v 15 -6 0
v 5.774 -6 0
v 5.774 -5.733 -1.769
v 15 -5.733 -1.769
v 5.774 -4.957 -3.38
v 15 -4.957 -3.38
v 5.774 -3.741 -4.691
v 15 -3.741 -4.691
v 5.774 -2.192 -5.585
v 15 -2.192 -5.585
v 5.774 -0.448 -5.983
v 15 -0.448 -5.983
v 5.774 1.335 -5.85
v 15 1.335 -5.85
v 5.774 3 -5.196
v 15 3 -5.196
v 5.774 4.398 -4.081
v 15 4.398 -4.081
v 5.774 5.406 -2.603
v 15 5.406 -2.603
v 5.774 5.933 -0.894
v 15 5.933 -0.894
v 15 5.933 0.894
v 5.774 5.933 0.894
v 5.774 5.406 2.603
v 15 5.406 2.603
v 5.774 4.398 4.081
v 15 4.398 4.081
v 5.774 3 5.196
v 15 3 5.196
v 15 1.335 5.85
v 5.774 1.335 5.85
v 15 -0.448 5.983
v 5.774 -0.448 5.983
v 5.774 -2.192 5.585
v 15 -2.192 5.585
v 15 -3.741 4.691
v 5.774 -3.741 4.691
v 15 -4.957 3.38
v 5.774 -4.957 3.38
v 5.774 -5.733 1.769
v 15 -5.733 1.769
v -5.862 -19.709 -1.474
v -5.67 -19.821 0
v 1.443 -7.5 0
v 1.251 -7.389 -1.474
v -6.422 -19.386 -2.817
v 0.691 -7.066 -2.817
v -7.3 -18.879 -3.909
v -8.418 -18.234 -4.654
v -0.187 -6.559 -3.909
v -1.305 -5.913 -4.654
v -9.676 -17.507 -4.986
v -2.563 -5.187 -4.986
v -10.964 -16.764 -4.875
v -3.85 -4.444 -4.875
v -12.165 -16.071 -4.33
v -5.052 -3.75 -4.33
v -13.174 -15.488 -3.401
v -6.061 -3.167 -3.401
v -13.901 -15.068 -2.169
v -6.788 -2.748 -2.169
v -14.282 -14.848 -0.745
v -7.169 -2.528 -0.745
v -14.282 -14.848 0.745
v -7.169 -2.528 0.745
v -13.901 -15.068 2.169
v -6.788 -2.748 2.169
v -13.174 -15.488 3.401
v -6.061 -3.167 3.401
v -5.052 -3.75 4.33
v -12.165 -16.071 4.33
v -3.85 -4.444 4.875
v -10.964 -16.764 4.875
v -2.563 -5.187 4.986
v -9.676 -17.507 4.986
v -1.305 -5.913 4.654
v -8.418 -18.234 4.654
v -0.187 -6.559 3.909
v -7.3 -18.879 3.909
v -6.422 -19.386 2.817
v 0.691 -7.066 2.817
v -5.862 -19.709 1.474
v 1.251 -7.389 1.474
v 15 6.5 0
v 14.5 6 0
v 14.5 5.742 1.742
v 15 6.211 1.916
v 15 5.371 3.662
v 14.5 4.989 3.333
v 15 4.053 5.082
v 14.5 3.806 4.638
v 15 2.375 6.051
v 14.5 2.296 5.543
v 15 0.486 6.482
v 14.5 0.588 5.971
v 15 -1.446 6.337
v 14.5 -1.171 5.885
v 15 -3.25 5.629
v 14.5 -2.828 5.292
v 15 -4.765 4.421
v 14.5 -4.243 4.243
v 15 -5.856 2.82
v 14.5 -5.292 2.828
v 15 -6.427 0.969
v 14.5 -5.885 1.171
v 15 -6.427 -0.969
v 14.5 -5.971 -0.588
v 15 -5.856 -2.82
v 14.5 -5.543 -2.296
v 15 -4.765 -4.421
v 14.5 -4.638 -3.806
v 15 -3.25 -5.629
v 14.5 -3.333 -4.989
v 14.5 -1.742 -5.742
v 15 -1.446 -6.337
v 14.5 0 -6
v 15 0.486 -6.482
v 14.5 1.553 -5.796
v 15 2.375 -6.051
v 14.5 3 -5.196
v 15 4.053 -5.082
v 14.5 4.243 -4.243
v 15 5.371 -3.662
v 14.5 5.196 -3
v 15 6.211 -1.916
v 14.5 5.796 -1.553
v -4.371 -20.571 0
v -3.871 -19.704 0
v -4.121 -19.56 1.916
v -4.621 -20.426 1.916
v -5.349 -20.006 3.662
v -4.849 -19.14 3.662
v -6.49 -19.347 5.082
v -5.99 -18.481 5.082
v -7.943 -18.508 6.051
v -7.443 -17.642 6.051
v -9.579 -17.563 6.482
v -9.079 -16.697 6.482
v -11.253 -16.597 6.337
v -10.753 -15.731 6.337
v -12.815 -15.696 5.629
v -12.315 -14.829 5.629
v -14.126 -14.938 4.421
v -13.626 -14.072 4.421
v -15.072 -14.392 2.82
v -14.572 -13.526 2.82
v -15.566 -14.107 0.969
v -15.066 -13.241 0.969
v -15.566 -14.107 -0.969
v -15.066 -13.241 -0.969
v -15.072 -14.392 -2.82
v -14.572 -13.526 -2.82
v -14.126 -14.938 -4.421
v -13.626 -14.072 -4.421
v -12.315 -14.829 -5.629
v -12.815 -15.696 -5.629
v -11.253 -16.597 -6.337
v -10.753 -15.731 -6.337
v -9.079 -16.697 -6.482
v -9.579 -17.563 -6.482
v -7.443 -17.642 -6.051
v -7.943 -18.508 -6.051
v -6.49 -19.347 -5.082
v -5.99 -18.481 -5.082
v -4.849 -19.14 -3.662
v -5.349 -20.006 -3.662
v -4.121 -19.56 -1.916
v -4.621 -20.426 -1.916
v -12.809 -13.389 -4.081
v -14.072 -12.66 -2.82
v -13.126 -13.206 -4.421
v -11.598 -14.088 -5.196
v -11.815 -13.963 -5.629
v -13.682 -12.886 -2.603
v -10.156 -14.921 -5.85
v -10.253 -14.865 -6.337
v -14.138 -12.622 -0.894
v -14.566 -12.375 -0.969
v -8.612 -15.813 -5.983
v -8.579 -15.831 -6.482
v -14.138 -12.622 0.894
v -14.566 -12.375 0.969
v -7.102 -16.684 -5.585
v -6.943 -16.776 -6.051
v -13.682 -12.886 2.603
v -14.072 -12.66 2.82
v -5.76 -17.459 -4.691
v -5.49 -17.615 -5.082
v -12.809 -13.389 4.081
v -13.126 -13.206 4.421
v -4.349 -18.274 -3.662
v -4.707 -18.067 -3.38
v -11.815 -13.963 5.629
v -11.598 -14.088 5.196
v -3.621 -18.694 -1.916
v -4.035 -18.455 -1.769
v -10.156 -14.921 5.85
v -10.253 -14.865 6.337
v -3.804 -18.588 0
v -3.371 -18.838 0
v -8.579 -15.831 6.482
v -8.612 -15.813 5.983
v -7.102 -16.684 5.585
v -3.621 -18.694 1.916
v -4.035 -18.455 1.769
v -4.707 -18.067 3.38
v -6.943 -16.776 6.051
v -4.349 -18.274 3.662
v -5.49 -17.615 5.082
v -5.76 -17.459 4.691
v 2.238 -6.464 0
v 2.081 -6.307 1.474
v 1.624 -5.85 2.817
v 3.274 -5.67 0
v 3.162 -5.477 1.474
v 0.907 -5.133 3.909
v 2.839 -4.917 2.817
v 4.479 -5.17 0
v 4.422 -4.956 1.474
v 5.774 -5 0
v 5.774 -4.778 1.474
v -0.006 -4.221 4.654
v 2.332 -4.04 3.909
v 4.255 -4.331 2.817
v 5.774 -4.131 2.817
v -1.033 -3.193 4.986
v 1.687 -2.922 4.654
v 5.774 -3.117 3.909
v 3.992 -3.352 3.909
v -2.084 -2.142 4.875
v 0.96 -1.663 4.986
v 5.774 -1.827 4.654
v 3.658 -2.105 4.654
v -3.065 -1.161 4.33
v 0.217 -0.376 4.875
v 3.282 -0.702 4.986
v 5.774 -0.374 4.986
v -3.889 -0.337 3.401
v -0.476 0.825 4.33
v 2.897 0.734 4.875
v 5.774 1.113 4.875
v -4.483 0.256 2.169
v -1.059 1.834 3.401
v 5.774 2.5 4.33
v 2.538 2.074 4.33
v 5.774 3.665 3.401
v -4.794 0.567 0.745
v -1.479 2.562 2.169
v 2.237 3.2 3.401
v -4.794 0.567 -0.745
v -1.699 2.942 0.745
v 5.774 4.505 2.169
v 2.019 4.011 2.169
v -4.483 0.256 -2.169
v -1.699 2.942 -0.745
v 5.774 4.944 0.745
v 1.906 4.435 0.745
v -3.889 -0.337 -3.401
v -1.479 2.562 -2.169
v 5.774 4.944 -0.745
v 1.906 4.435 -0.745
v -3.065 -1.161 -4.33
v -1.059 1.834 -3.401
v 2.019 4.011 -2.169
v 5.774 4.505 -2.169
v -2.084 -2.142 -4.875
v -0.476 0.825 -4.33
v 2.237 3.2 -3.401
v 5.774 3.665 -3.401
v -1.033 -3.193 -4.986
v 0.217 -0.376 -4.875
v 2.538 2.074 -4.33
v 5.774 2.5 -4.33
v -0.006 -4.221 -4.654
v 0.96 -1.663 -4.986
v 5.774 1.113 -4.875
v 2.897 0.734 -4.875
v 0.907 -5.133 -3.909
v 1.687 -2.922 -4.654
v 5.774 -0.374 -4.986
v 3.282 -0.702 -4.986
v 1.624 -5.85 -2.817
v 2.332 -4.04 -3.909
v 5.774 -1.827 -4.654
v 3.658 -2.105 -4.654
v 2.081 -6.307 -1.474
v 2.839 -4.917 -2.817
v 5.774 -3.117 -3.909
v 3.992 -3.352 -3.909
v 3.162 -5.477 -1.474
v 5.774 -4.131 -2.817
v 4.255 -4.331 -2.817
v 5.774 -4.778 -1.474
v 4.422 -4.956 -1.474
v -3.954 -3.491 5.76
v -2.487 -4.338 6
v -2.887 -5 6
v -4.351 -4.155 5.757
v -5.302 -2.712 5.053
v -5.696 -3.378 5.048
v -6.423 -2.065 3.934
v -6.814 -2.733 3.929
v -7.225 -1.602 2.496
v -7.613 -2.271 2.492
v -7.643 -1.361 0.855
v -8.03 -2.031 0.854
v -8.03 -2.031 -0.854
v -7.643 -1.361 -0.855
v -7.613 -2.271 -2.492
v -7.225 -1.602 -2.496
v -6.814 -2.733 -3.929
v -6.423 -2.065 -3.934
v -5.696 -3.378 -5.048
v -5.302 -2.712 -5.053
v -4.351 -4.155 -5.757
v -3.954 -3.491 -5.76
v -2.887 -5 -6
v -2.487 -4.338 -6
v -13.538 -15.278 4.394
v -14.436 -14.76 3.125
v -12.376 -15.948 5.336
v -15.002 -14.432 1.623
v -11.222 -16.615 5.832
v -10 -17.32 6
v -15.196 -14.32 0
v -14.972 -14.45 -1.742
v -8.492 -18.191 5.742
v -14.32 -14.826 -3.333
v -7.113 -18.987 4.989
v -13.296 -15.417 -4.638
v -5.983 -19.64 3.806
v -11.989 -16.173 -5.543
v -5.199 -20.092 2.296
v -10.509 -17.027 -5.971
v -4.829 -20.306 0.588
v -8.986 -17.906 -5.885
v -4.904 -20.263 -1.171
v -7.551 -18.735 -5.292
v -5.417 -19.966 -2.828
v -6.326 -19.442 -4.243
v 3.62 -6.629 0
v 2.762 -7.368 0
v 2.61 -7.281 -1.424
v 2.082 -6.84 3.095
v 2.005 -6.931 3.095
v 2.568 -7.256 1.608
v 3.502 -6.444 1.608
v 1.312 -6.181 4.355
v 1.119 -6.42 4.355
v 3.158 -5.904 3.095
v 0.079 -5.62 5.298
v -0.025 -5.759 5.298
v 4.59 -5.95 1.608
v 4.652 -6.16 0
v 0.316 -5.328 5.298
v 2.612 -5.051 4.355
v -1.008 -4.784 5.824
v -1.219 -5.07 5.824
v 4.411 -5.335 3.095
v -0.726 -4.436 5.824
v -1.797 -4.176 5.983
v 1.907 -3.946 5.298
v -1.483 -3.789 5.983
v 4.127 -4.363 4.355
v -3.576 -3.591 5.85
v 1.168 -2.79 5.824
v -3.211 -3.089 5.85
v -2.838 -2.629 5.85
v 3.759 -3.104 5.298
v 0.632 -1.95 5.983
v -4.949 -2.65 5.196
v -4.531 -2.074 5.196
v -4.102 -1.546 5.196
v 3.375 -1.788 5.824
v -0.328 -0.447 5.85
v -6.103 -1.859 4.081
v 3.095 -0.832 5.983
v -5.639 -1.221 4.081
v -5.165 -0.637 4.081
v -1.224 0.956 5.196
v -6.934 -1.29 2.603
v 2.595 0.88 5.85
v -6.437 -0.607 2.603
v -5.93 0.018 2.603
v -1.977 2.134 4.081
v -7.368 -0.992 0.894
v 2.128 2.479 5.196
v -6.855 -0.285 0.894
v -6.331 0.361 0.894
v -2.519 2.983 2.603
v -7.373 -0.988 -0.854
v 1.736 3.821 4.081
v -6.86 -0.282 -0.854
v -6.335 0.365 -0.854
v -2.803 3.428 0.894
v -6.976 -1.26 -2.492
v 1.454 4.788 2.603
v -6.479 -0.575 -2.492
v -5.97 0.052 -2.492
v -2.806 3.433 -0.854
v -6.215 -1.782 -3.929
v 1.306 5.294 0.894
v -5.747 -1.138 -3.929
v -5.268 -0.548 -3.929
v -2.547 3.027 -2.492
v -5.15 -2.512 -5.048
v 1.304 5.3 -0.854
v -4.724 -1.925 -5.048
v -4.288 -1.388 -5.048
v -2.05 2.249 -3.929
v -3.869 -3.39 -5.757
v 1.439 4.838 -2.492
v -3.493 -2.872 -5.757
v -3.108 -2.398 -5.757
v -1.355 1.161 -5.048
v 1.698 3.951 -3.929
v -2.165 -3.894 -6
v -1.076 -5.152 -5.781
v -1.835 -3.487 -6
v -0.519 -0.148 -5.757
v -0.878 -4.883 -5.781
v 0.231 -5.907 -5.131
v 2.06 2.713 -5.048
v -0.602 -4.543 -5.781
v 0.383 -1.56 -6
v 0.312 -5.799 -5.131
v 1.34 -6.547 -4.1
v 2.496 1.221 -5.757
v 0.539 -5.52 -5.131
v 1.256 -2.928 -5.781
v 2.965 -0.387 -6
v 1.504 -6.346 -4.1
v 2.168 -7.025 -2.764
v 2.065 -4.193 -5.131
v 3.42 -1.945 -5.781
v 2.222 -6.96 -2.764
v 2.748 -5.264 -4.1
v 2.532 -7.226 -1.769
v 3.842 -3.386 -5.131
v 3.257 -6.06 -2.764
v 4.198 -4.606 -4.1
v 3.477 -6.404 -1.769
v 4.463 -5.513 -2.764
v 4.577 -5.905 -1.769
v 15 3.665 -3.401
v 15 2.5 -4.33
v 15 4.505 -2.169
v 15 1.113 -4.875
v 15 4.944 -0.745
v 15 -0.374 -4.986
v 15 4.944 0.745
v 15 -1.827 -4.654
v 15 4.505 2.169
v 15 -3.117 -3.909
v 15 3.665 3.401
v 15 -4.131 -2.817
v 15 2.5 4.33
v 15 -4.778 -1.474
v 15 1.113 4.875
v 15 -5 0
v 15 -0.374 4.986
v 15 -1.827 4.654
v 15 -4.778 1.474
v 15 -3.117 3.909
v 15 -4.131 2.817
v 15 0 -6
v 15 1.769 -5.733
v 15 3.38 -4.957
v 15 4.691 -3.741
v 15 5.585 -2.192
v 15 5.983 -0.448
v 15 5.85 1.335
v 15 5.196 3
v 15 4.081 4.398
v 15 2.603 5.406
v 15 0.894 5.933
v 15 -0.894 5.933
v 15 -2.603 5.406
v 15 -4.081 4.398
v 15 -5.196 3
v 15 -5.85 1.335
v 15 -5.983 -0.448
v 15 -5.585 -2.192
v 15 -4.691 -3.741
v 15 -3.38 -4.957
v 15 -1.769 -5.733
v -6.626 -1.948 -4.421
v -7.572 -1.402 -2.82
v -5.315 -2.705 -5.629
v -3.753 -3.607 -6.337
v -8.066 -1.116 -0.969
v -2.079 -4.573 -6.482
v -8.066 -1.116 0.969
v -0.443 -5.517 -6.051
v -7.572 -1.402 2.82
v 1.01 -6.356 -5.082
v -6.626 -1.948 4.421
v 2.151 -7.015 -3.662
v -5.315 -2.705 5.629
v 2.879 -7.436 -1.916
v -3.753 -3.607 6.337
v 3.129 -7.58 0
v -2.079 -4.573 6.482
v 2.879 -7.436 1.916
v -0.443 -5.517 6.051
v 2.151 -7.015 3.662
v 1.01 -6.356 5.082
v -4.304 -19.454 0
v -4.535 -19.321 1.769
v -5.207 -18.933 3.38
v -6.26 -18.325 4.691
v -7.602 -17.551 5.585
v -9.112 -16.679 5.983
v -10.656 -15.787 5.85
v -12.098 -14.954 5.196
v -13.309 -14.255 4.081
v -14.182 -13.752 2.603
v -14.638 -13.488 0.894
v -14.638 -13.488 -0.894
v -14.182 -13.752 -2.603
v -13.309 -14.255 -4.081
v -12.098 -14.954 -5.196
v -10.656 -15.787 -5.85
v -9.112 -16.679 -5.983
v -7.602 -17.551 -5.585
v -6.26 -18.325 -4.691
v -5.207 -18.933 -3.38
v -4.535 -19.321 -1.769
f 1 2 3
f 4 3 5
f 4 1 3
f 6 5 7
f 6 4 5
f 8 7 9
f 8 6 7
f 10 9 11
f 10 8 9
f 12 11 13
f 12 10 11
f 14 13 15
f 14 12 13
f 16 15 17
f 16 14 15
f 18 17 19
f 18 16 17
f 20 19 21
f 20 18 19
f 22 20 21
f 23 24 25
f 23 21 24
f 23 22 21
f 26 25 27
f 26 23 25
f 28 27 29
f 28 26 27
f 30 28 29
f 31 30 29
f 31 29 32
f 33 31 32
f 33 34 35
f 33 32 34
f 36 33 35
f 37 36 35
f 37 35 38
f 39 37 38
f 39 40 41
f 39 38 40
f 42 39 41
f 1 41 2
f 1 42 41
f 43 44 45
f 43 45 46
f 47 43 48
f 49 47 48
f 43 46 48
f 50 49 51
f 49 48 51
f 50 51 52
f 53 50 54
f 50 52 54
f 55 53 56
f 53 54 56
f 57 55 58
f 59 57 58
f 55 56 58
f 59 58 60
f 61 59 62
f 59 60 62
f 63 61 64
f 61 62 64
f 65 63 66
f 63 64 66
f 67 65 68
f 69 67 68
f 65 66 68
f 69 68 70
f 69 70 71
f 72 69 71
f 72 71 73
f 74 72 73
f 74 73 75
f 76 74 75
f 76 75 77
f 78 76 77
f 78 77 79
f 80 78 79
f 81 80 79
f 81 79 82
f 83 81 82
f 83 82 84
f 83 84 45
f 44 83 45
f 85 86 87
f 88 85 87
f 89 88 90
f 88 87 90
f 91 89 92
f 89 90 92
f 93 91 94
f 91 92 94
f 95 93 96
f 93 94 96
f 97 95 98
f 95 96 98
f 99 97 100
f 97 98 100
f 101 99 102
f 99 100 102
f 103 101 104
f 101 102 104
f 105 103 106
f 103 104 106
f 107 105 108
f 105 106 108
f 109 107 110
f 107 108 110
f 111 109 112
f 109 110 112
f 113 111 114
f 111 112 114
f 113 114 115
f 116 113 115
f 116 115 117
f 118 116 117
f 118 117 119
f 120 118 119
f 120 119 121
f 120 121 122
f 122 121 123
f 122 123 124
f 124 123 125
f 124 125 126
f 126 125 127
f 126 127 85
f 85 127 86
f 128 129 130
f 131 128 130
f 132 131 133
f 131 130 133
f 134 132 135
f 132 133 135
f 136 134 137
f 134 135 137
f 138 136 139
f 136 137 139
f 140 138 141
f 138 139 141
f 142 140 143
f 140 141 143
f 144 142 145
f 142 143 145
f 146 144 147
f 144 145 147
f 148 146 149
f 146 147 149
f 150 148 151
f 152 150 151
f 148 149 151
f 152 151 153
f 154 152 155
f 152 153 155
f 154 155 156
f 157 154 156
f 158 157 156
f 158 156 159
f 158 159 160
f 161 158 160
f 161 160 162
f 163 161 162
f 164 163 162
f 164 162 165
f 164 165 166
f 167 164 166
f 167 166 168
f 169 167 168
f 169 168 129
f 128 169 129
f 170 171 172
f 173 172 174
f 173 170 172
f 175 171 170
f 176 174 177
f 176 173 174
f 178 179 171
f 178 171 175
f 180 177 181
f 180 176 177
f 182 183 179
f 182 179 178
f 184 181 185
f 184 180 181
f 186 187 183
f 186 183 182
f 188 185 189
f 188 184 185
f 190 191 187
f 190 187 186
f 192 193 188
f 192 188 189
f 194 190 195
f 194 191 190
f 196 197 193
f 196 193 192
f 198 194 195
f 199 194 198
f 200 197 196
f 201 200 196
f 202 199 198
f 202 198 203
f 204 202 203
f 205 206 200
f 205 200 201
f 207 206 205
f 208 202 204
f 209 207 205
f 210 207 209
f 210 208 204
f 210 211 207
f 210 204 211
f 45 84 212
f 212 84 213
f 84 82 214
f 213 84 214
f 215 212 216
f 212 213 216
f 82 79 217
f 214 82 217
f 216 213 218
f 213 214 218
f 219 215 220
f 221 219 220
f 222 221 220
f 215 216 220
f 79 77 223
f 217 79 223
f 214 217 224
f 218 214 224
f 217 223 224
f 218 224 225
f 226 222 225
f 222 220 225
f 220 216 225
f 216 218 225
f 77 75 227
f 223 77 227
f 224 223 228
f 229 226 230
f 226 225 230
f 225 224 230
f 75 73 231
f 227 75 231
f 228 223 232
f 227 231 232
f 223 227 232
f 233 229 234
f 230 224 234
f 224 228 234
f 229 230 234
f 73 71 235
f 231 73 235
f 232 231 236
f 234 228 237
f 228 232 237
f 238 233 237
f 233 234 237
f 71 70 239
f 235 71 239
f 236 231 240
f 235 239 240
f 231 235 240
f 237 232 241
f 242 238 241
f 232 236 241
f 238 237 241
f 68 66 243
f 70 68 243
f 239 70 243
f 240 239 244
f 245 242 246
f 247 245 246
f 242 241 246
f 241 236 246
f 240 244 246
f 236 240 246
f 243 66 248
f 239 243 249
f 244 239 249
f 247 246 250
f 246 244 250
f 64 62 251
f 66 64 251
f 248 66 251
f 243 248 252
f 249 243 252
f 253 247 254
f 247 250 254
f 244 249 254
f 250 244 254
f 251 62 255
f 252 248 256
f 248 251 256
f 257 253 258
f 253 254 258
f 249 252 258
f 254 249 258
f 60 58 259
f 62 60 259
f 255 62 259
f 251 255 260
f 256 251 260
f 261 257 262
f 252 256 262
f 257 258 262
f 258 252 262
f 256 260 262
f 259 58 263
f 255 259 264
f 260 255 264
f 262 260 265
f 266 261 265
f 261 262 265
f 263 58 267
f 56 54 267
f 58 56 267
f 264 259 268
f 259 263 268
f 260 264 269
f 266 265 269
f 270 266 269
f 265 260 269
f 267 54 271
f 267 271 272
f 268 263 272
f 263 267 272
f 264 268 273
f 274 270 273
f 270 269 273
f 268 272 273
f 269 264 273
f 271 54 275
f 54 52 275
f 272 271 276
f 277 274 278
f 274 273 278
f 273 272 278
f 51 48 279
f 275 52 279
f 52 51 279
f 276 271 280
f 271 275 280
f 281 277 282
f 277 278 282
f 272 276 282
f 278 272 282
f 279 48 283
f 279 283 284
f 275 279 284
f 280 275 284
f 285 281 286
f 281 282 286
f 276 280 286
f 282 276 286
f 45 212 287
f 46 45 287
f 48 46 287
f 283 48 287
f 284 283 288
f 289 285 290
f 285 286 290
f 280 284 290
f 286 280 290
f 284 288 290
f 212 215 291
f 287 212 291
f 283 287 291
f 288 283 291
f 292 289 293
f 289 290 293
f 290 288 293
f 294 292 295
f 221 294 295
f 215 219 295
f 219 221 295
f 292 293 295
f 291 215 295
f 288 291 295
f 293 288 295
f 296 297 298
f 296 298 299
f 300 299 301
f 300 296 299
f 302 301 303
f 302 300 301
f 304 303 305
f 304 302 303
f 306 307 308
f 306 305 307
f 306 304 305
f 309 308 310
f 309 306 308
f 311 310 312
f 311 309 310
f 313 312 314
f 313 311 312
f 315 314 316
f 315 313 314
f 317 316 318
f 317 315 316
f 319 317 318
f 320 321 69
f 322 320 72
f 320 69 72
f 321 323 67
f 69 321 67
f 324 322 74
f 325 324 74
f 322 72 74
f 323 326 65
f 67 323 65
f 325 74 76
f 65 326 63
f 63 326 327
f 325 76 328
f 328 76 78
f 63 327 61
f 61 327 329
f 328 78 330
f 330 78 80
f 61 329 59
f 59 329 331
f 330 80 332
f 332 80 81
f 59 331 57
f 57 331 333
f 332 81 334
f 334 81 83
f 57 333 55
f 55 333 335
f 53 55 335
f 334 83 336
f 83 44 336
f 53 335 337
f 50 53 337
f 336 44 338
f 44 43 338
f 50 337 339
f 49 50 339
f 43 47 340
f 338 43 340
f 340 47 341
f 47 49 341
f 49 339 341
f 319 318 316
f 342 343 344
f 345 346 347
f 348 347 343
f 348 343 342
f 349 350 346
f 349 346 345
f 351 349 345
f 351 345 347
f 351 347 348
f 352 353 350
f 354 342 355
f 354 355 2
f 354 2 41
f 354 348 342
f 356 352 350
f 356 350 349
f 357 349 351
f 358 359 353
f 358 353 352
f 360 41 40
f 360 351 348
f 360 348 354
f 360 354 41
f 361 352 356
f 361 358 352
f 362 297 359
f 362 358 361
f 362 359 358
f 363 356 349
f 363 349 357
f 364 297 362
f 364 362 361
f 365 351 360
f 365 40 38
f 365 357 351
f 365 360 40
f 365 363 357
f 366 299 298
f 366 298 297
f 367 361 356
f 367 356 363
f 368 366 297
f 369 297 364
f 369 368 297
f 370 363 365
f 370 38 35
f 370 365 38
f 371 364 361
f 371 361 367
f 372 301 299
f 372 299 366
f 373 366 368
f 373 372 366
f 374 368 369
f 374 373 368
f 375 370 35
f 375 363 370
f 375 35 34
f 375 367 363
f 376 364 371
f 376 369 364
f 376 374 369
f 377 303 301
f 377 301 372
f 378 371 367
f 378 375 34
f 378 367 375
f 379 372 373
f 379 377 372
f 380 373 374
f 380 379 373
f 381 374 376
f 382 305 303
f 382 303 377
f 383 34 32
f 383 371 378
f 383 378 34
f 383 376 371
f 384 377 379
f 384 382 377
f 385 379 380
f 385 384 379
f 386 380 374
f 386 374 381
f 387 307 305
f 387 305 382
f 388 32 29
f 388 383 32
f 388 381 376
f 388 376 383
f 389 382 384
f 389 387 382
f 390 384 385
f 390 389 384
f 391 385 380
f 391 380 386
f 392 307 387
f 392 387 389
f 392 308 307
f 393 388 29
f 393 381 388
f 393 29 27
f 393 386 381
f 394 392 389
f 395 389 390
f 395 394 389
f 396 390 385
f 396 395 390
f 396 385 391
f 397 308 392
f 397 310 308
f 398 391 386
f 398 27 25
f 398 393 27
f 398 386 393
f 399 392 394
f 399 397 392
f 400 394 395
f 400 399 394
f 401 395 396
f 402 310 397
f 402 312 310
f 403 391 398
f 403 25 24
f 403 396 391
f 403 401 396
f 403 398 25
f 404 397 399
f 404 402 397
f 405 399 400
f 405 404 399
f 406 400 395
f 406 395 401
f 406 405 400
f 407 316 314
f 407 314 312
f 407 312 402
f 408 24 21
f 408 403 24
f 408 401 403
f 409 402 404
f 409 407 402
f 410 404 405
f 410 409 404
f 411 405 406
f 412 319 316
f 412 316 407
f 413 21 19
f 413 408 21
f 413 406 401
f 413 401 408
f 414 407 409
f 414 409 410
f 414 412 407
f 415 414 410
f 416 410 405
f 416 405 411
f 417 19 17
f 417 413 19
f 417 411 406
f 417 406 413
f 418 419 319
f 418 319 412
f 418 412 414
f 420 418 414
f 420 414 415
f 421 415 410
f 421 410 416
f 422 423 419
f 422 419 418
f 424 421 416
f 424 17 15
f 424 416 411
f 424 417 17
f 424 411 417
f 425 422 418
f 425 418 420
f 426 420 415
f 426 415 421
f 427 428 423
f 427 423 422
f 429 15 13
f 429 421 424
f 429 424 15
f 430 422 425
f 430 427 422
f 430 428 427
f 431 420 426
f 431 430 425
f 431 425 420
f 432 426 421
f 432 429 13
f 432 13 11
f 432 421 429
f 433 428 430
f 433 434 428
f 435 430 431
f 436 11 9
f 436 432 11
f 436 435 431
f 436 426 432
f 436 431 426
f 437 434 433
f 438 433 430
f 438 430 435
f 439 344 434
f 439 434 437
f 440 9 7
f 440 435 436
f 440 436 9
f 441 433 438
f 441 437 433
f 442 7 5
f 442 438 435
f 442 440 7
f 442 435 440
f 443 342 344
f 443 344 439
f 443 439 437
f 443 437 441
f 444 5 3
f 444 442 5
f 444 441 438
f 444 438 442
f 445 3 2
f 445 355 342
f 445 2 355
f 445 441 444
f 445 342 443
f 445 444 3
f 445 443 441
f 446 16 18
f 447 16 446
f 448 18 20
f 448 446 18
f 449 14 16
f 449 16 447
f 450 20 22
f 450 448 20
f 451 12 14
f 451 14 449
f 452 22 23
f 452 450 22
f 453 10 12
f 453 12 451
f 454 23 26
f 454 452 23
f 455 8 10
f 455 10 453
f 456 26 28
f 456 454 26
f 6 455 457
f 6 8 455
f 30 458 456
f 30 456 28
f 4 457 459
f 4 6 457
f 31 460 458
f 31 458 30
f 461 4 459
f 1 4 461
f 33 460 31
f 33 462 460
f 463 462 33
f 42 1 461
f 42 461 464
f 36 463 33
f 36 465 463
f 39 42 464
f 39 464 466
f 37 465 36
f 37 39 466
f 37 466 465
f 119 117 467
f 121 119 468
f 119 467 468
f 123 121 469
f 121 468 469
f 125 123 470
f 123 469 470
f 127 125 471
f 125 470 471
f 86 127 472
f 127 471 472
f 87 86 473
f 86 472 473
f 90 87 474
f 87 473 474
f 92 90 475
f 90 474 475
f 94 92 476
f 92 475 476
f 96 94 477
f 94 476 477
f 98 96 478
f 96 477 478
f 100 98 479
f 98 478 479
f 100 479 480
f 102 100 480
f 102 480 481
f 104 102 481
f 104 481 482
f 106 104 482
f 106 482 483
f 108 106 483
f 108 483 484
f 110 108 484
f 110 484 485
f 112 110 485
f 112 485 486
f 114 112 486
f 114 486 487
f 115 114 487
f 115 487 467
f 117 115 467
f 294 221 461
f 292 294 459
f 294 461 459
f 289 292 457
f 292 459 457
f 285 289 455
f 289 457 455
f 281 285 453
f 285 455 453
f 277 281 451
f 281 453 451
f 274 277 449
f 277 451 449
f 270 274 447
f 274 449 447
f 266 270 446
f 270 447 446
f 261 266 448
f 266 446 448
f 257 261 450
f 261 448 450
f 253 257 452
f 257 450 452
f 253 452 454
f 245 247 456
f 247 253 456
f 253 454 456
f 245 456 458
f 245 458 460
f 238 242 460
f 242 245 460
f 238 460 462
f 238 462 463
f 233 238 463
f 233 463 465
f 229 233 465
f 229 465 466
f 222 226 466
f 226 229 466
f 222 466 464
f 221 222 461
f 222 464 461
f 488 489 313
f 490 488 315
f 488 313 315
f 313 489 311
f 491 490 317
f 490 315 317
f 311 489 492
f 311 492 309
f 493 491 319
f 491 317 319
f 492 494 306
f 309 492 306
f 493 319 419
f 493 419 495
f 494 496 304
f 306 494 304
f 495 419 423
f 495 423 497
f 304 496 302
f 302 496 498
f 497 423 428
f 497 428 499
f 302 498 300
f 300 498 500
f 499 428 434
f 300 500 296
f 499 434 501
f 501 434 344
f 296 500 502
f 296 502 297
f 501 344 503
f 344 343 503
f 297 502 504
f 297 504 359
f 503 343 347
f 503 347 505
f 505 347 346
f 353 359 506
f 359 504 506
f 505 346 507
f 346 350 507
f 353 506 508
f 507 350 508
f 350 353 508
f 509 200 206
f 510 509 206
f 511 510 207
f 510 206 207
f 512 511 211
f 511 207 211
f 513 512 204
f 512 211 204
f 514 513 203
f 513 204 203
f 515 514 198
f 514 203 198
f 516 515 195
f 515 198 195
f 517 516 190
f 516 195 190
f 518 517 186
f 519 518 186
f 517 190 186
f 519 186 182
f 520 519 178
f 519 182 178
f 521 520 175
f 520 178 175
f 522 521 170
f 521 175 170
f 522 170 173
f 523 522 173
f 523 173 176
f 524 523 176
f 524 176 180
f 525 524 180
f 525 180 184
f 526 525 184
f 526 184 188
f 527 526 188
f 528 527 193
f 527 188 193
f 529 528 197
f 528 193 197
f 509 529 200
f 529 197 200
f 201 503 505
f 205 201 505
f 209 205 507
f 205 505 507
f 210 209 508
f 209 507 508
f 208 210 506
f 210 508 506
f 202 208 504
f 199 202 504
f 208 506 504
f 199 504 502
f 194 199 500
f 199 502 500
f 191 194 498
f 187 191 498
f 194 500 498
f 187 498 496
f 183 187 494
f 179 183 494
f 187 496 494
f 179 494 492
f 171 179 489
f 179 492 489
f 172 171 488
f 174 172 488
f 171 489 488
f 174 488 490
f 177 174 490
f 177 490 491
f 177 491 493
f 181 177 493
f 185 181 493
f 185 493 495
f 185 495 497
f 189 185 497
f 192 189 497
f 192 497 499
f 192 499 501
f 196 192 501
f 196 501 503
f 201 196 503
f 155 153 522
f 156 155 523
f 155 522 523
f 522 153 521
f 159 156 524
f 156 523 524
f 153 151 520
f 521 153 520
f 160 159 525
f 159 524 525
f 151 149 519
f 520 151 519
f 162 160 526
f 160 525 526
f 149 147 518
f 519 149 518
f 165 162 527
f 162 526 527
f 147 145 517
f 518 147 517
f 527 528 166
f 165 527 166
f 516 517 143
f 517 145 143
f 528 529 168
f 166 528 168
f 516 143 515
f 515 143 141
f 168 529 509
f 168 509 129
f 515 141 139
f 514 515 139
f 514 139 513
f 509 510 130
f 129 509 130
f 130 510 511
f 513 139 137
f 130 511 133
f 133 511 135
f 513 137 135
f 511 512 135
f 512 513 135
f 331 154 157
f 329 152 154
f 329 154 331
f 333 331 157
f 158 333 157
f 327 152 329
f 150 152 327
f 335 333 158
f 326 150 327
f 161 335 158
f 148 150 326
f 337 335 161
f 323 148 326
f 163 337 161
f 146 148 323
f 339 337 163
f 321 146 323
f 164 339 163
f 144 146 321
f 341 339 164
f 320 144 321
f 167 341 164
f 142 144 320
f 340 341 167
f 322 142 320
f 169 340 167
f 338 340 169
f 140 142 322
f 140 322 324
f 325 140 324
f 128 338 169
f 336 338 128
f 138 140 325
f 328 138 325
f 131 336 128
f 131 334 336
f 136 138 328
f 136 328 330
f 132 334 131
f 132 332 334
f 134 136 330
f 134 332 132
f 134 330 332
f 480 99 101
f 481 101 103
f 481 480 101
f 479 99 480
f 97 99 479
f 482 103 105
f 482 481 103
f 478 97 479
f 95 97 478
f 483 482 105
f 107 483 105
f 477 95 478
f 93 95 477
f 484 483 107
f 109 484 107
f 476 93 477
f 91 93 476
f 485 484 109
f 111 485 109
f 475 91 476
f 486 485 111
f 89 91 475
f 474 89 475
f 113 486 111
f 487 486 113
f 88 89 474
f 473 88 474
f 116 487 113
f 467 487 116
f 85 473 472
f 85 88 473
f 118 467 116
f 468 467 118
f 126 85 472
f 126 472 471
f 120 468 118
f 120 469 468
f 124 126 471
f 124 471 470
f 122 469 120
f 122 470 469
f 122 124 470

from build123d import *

# Parameters (mm, degrees)
SWEEP_THIN1_PROFILE_R   = 6
SWEEP_THIN1_PROFILE_R_2 = 5
BOSS_EXTRUDE1_START     = -15
SKETCH17_R              = 6.5
SKETCH17_R_2            = 6
BOSS_EXTRUDE1_DEPTH     = 15
CUT_EXTRUDE1_START      = -2
SKETCH17_3_R            = 6.5
SKETCH17_3_R_2          = 6
CUT_EXTRUDE1_DEPTH      = 1
SKETCH18_R              = 6.5
SKETCH18_R_2            = 6
BOSS_EXTRUDE2_DEPTH     = 1


with BuildPart() as part:
    # Sweep-Thin1: sweep along a path in Sketch1
    with BuildLine(Plane.XY) as sweep_thin1_path:
        Line((-10, -17.320508076), (-2.886751346, -5))
        ThreePointArc((-2.886751346, -5), (0.773502692, -1.339745962), (5.773502692, 0))
        Line((5.773502692, 0), (15, 0))
    # Sweep-Thin1 profile (on start of the path) → Sweep-Thin1 (sweep)
    with BuildSketch(Plane(origin=(-10, -17.320508076, 0), x_dir=(0.8660254037844363, -0.5000000000000041, 0), z_dir=(0.5000000000000041, 0.8660254037844363, 0))):
        Circle(SWEEP_THIN1_PROFILE_R)
        Circle(SWEEP_THIN1_PROFILE_R_2, mode=Mode.SUBTRACT)
    sweep(path=sweep_thin1_path.line)

    # Sketch17 → Boss-Extrude1 (add)
    with BuildSketch(Plane(origin=(-10, -17.320508076, 0), x_dir=(0.8660254037844363, -0.5000000000000042, 0), z_dir=(-0.5000000000000041, -0.8660254037844362, 0)).offset(BOSS_EXTRUDE1_START)):
        Circle(SKETCH17_R)
        Circle(SKETCH17_R_2, mode=Mode.SUBTRACT)
    extrude(amount=BOSS_EXTRUDE1_DEPTH)

    # Sketch17<3> → Cut-Extrude1 (cut)
    with BuildSketch(Plane(origin=(-10, -17.320508076, 0), x_dir=(0.8660254037844363, -0.5000000000000042, 0), z_dir=(-0.5000000000000041, -0.8660254037844362, 0)).offset(CUT_EXTRUDE1_START)):
        Circle(SKETCH17_3_R)
        Circle(SKETCH17_3_R_2, mode=Mode.SUBTRACT)
    extrude(amount=CUT_EXTRUDE1_DEPTH, mode=Mode.SUBTRACT)


with BuildPart() as body_2:
    # Sketch18 → Boss-Extrude2 (new body)
    with BuildSketch(Plane(origin=(15, 0, 0), x_dir=(0, 0, -1), z_dir=(1, 0, 0))):
        Circle(SKETCH18_R)
        Circle(SKETCH18_R_2, mode=Mode.SUBTRACT)
    extrude(amount=-BOSS_EXTRUDE2_DEPTH)

    # Chamfer1: read off the stored shape, not the designer's step
    # Chamfer1 outline → Chamfer1 (revolve, cut)
    with BuildSketch(Plane.YX):
        Polygon((6.5, 15), (6, 14.5), (6, 14), (6.5, 14), align=None)
    revolve(axis=Axis((0, 0, 0), (1, 0, 0)), mode=Mode.SUBTRACT)


solid = Compound([part.part, body_2.part])
